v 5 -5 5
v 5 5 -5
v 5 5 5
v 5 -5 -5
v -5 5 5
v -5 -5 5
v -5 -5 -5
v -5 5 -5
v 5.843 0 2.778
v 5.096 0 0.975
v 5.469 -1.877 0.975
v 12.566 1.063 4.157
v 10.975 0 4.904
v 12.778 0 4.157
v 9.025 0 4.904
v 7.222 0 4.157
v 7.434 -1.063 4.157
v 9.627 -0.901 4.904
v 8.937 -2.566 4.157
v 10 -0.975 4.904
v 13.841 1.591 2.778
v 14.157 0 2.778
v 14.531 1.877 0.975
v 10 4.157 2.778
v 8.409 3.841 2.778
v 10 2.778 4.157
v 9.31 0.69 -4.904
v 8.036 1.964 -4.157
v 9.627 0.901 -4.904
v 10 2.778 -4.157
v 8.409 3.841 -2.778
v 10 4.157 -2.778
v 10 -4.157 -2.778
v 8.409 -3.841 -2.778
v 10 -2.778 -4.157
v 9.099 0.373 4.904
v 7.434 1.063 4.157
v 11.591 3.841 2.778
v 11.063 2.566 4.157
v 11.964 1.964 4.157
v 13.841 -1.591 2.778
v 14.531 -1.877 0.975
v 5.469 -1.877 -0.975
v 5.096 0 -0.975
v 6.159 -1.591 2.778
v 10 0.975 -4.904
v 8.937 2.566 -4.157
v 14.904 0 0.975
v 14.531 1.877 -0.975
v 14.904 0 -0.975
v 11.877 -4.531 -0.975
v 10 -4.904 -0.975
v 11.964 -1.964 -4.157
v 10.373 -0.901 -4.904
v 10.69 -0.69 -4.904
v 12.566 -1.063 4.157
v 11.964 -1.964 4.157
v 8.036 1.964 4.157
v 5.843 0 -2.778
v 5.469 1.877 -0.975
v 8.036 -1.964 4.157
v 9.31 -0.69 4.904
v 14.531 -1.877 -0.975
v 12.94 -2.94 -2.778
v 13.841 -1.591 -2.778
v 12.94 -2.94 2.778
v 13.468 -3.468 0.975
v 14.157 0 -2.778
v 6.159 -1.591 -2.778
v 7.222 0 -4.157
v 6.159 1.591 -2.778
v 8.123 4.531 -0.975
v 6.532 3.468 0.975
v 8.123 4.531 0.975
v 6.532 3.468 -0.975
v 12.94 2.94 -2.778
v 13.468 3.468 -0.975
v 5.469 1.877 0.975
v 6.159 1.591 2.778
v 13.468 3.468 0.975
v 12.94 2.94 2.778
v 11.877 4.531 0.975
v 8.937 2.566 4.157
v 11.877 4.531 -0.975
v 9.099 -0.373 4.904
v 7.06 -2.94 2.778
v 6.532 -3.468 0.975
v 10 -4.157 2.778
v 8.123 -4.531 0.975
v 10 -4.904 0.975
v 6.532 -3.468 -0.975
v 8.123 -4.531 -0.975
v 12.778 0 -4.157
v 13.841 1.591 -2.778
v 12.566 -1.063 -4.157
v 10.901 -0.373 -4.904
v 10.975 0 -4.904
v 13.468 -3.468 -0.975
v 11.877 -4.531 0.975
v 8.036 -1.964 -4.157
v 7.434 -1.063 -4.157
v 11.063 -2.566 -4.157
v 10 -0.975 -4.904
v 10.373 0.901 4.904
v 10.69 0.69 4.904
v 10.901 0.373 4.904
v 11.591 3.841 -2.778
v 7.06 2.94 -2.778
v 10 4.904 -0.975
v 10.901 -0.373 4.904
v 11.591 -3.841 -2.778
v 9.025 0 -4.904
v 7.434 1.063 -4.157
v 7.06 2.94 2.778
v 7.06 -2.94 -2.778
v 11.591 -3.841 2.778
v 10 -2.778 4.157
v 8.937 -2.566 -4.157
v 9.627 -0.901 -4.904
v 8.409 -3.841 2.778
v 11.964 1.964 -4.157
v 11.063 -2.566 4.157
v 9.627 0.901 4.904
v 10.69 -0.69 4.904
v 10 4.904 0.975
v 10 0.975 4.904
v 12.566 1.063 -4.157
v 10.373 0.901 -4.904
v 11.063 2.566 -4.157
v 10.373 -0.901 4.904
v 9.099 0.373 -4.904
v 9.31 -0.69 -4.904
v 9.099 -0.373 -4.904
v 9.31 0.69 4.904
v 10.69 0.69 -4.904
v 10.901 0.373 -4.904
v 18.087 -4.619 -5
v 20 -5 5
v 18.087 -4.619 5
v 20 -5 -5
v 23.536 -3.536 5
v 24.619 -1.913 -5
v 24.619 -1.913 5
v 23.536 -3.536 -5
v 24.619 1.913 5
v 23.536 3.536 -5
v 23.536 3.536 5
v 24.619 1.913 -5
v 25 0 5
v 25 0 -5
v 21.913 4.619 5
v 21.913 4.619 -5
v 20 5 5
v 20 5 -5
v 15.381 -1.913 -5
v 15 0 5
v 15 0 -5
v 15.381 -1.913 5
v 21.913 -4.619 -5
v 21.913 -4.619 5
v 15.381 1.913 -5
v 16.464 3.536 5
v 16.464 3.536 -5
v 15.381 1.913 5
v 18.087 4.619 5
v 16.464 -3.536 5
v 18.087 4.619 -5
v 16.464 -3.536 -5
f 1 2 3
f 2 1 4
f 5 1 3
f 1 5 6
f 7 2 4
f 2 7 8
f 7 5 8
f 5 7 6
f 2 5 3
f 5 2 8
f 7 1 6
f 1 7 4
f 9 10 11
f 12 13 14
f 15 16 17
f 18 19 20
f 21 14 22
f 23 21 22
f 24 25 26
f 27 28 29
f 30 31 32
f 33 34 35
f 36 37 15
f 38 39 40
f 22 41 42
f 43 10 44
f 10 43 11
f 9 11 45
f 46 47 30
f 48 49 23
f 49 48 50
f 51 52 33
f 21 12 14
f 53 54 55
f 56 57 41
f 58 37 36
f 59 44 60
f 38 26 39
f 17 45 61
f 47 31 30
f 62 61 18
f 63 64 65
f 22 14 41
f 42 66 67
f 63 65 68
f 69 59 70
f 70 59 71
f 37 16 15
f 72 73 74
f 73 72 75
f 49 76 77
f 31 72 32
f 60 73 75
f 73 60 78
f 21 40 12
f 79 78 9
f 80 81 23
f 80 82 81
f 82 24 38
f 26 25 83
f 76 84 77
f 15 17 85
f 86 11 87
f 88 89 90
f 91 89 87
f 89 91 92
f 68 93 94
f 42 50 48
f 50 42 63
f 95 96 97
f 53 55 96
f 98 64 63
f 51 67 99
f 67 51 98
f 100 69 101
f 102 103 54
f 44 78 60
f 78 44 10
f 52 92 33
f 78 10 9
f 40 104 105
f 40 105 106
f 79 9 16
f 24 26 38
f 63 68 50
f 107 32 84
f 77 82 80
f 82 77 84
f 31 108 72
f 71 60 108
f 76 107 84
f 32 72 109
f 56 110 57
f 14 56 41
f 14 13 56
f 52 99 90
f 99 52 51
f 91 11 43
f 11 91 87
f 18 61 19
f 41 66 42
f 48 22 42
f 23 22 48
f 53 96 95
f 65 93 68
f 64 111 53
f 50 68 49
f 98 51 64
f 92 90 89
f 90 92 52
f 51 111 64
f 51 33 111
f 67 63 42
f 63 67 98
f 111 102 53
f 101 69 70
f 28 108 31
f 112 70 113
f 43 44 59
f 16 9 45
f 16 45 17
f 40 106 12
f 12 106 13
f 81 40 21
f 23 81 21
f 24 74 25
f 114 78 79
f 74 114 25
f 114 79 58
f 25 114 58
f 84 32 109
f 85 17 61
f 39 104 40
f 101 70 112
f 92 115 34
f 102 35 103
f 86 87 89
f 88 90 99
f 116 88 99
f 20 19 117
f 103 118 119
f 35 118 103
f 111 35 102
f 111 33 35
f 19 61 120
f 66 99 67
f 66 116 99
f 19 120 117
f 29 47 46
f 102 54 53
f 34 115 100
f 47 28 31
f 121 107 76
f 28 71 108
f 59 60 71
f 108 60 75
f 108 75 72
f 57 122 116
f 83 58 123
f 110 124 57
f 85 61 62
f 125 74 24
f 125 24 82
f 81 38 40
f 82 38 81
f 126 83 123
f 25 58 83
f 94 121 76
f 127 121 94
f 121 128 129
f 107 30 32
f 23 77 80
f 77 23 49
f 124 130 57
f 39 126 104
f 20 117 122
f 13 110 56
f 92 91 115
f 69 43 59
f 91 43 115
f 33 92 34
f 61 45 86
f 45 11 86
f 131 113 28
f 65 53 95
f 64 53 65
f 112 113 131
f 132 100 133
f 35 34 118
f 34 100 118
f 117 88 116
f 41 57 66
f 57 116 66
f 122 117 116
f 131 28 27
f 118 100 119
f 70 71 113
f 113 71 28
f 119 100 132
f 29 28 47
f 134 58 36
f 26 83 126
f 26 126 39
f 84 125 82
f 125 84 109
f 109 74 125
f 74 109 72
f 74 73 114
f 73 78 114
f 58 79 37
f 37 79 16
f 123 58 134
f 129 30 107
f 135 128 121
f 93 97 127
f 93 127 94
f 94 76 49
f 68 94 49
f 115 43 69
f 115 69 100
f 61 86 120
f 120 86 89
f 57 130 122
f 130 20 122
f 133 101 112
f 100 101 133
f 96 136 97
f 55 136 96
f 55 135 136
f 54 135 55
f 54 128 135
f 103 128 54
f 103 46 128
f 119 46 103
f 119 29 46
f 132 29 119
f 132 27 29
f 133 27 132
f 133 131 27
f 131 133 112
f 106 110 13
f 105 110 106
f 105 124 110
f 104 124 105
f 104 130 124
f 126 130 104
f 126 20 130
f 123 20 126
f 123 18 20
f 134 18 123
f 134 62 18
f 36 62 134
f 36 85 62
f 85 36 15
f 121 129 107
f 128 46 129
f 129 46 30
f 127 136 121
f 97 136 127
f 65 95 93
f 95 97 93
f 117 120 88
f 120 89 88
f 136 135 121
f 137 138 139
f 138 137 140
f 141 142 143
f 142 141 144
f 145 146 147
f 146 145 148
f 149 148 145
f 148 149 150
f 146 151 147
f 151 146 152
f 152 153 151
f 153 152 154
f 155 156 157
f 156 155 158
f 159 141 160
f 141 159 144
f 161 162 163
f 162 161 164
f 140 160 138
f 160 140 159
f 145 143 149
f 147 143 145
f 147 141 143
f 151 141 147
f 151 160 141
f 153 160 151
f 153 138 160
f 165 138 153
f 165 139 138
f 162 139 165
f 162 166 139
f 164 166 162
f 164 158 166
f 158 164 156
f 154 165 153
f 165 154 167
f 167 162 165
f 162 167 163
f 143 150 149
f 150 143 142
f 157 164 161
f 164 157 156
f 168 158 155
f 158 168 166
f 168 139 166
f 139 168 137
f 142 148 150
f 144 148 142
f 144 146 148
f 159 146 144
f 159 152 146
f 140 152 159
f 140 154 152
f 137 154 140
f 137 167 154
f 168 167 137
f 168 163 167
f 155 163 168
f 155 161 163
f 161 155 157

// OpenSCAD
translate([0, 0, 0]) {
    cube([10, 10, 10], center = true);
}
translate([10, 0, 0]) {
    sphere(5, center = true);
}

translate([20, 0, 0]) {
    cylinder(h = 10, r1 = 5, r2 = 5, center = true);
}
